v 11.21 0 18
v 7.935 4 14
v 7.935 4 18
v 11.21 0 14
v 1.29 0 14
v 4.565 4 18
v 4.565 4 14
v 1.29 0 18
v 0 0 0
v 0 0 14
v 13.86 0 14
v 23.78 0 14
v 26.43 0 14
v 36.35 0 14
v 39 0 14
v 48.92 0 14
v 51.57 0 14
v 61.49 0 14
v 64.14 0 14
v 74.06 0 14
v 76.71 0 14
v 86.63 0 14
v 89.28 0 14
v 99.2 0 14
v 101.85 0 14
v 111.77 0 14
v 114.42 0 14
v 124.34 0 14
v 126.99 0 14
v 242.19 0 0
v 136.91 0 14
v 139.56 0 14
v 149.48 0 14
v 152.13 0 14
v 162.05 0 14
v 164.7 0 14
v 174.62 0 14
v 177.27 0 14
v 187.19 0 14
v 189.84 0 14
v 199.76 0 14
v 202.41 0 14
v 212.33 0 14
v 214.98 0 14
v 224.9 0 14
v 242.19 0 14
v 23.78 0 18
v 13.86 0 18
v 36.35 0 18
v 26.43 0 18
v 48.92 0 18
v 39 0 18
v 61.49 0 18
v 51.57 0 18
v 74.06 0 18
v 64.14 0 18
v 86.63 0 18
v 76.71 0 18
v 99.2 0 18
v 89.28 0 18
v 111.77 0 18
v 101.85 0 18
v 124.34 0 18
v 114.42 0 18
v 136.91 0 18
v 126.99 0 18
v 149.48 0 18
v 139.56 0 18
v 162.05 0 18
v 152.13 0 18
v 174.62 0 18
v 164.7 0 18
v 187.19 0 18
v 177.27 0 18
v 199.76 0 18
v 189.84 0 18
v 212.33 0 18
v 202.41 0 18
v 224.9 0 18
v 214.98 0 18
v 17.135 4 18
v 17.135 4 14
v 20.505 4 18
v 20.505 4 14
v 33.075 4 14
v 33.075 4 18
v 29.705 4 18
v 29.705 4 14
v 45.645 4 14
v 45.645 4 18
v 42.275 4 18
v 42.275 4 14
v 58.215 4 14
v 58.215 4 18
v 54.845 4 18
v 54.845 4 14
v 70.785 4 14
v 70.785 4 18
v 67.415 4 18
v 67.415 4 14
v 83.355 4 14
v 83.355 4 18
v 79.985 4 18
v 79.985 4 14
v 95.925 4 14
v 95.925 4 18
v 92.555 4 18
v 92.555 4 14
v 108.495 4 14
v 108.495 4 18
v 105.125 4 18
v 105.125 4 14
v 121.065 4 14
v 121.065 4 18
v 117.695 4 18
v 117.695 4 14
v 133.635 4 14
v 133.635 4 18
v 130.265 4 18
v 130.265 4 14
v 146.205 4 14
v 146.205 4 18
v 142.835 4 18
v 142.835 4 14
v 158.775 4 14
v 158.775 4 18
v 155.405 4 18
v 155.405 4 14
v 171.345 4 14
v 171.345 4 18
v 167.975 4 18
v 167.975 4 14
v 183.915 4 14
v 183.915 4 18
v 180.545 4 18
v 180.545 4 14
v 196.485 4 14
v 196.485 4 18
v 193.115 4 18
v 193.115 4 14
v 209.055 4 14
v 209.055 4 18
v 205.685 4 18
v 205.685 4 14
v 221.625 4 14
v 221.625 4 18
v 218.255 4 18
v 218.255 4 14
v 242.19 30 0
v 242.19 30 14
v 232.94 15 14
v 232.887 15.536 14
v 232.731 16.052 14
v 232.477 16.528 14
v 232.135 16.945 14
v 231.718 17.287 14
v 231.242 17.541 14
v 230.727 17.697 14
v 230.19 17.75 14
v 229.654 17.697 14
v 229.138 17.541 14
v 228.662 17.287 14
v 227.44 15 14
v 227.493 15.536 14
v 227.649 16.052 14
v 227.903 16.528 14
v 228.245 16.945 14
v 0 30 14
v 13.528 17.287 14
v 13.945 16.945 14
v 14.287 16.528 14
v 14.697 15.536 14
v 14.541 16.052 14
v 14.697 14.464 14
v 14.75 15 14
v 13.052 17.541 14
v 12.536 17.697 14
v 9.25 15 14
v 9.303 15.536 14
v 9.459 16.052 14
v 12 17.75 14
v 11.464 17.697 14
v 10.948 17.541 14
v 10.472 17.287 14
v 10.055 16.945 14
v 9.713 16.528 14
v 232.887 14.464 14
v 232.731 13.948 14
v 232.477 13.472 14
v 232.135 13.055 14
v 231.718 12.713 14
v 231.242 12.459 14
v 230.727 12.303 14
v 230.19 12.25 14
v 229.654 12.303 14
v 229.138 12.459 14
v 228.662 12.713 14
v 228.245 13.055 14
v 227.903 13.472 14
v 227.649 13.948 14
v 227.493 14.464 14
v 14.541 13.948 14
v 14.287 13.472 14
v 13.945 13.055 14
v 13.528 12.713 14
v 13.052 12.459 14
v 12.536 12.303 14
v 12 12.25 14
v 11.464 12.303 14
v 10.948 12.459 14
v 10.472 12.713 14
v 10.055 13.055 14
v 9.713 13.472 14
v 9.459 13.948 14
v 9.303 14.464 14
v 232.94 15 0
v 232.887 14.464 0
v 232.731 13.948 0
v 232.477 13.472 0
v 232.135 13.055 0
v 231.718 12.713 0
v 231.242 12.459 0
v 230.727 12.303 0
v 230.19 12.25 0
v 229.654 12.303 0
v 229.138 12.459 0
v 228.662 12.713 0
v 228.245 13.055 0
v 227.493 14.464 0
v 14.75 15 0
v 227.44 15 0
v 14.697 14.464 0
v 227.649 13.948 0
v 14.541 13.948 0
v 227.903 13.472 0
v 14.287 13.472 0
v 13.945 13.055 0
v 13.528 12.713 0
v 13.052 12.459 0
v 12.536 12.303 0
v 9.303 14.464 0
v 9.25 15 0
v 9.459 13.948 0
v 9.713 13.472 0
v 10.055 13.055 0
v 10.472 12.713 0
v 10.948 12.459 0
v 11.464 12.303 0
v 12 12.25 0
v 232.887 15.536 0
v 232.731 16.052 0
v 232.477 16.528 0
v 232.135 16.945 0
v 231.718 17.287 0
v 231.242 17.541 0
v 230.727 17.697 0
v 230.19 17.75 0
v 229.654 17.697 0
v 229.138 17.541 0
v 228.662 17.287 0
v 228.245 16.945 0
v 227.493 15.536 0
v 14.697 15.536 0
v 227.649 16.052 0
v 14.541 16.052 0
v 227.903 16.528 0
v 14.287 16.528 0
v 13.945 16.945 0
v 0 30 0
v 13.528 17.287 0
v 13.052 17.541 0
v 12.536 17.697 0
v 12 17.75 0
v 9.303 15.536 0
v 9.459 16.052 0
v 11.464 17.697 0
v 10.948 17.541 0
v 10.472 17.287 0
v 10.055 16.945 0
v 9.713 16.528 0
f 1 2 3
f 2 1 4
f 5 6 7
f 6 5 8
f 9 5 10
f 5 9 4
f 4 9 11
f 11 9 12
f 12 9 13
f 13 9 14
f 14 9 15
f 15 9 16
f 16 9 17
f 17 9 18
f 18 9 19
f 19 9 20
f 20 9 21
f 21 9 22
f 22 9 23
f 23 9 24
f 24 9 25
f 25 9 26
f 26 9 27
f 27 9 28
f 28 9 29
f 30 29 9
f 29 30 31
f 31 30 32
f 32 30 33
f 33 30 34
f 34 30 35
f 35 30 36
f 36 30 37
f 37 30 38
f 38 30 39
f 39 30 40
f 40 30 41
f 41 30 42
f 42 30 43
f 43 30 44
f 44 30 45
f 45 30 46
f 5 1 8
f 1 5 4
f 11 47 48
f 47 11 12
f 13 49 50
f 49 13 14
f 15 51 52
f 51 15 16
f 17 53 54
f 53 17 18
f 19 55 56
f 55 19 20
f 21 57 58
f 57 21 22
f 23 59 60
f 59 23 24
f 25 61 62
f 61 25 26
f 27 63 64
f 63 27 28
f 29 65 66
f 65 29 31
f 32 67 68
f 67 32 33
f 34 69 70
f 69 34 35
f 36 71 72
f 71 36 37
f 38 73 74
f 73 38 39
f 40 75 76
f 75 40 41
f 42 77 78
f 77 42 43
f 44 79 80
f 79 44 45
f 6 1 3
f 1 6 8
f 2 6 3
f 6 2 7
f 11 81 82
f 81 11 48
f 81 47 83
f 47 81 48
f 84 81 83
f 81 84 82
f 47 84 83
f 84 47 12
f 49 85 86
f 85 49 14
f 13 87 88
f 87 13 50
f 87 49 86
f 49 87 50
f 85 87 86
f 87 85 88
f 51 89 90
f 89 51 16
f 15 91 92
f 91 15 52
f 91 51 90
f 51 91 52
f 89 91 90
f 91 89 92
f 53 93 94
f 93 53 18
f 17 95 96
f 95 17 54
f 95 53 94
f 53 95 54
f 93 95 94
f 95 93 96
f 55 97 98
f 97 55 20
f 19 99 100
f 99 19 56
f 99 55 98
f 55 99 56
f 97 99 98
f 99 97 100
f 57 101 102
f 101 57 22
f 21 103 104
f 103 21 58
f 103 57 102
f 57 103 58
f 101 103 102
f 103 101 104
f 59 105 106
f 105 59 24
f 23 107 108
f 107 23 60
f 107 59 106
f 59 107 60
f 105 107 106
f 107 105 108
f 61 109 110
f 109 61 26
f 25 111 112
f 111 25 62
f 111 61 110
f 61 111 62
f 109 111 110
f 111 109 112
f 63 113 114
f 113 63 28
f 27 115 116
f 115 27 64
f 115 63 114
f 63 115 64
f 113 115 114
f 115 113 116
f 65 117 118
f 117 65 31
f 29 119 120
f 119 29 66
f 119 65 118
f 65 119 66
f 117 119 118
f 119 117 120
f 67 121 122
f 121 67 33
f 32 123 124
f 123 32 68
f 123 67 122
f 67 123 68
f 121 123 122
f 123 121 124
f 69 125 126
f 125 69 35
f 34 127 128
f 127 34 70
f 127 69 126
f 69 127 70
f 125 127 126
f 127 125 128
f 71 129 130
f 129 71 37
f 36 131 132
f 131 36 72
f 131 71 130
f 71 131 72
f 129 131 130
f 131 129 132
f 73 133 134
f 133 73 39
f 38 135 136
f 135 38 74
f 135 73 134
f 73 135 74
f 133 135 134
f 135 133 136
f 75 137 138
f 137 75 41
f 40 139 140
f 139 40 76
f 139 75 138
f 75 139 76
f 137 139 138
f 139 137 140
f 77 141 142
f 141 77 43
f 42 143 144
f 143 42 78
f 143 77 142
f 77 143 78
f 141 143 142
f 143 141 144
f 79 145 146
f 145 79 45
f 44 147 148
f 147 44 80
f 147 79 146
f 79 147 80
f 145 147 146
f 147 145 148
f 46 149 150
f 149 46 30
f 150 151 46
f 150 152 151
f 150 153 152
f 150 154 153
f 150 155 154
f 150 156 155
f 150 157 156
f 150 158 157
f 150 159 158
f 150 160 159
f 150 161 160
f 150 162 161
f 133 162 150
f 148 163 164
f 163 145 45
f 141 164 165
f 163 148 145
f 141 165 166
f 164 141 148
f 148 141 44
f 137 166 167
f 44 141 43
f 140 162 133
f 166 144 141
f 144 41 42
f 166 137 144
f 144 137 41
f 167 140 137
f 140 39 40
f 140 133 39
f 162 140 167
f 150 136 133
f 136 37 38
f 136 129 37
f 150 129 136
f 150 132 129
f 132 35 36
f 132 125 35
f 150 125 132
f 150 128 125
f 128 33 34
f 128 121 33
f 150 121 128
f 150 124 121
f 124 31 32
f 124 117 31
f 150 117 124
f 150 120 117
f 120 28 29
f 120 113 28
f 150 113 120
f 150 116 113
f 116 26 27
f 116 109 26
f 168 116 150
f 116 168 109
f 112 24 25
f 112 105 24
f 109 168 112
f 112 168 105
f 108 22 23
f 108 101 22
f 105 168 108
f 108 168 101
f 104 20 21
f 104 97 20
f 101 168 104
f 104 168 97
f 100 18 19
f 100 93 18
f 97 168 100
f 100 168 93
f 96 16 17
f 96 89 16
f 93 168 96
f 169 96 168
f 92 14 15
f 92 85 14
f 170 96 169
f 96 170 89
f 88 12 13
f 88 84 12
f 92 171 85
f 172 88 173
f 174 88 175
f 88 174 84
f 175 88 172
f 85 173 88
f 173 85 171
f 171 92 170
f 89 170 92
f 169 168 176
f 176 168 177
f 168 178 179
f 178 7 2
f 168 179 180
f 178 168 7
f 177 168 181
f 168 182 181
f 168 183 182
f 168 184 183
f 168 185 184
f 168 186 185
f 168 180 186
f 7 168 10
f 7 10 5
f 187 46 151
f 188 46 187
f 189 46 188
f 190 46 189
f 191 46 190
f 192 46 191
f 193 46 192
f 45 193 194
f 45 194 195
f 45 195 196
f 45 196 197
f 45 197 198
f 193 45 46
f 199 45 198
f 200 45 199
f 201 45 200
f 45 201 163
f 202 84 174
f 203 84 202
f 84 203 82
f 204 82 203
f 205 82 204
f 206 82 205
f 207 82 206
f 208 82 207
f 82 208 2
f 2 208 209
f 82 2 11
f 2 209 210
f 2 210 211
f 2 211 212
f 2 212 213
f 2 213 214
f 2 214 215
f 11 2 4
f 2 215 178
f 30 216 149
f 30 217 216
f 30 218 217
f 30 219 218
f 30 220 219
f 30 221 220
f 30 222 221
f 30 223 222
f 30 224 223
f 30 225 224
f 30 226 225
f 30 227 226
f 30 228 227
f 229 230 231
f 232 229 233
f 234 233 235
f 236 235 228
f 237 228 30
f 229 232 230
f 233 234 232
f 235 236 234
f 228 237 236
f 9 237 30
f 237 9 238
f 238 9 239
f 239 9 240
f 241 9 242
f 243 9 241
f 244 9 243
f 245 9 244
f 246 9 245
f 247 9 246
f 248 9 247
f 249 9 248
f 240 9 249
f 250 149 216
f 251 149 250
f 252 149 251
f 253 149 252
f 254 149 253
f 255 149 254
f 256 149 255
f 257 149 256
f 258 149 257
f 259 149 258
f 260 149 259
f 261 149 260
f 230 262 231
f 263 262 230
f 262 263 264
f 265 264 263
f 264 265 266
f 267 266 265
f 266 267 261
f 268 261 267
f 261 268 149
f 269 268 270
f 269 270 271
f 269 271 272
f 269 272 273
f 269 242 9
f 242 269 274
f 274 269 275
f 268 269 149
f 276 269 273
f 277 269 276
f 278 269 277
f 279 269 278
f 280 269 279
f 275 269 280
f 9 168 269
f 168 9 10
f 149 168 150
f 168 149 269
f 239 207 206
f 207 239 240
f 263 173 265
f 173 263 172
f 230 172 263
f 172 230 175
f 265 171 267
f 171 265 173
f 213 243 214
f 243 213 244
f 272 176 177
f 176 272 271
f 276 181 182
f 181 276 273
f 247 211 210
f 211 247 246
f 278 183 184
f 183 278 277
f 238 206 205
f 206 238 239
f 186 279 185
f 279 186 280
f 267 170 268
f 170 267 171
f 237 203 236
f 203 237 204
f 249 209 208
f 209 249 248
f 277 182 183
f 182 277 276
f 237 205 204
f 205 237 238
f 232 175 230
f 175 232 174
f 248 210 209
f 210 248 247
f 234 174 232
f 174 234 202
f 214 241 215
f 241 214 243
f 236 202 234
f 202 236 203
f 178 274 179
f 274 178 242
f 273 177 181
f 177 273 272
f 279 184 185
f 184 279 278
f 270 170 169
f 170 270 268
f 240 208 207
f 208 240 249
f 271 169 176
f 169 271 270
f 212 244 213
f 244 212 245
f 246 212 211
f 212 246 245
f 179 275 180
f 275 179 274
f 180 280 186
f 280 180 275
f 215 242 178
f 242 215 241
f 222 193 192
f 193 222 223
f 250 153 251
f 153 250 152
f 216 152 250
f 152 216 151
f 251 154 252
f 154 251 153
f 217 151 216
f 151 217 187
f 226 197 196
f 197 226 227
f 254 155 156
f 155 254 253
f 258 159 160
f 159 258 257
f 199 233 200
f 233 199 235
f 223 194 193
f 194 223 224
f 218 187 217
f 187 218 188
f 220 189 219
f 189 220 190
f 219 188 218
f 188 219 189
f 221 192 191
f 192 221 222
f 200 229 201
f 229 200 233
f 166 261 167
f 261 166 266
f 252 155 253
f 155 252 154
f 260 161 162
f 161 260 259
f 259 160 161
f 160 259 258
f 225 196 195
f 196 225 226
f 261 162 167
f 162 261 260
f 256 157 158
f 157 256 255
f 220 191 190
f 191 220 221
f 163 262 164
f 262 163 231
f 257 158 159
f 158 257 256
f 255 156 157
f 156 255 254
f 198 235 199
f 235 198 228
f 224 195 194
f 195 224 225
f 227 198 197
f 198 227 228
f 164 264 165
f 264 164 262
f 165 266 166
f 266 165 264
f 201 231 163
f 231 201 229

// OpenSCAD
$fn = 32;

// ----------------------------------------------------------------------
// Gear rack: m=4 z=18, 242.19 x 30 x 18 mm
// ----------------------------------------------------------------------

// --- parameters (mm) ---
bar_len = 242.19;         // rack length, X
bar_w = 30;               // rack width, Y
bar_h = 18;               // overall height, Z
gear_module = 4;          // module
base_t = 14;              // tooth root line height
pitch = 12.57;            // circular pitch
tip_w = 3.37;             // tooth thickness at the tip
root_w = 9.92;            // tooth thickness at the root line
hole_d = 5.5;             // mounting hole
sink = 0.6;               // tooth root overlap into the body

tooth_span = 226.19;

module tooth(x0) {
  /* 20 deg flank profile, sunk into the body for a positive overlap */
  translate([x0, 0, base_t - sink])
    linear_extrude(height = bar_h - base_t + sink)
      polygon(points = [[-root_w / 2, 0], [root_w / 2, 0],
                        [tip_w / 2, bar_h - base_t],
                        [-tip_w / 2, bar_h - base_t]]);
}

difference() {
  union() {
    cube([bar_len, bar_w, base_t]);
    for (i = [0 : 18 - 1])
      tooth((i + 0.5) * pitch + (tooth_span - 18 * pitch) / 2);
  }
  translate([12, 15, -1]) cylinder(h = base_t + 2, d = hole_d);
  translate([230.19, 15, -1]) cylinder(h = base_t + 2, d = hole_d);
}
